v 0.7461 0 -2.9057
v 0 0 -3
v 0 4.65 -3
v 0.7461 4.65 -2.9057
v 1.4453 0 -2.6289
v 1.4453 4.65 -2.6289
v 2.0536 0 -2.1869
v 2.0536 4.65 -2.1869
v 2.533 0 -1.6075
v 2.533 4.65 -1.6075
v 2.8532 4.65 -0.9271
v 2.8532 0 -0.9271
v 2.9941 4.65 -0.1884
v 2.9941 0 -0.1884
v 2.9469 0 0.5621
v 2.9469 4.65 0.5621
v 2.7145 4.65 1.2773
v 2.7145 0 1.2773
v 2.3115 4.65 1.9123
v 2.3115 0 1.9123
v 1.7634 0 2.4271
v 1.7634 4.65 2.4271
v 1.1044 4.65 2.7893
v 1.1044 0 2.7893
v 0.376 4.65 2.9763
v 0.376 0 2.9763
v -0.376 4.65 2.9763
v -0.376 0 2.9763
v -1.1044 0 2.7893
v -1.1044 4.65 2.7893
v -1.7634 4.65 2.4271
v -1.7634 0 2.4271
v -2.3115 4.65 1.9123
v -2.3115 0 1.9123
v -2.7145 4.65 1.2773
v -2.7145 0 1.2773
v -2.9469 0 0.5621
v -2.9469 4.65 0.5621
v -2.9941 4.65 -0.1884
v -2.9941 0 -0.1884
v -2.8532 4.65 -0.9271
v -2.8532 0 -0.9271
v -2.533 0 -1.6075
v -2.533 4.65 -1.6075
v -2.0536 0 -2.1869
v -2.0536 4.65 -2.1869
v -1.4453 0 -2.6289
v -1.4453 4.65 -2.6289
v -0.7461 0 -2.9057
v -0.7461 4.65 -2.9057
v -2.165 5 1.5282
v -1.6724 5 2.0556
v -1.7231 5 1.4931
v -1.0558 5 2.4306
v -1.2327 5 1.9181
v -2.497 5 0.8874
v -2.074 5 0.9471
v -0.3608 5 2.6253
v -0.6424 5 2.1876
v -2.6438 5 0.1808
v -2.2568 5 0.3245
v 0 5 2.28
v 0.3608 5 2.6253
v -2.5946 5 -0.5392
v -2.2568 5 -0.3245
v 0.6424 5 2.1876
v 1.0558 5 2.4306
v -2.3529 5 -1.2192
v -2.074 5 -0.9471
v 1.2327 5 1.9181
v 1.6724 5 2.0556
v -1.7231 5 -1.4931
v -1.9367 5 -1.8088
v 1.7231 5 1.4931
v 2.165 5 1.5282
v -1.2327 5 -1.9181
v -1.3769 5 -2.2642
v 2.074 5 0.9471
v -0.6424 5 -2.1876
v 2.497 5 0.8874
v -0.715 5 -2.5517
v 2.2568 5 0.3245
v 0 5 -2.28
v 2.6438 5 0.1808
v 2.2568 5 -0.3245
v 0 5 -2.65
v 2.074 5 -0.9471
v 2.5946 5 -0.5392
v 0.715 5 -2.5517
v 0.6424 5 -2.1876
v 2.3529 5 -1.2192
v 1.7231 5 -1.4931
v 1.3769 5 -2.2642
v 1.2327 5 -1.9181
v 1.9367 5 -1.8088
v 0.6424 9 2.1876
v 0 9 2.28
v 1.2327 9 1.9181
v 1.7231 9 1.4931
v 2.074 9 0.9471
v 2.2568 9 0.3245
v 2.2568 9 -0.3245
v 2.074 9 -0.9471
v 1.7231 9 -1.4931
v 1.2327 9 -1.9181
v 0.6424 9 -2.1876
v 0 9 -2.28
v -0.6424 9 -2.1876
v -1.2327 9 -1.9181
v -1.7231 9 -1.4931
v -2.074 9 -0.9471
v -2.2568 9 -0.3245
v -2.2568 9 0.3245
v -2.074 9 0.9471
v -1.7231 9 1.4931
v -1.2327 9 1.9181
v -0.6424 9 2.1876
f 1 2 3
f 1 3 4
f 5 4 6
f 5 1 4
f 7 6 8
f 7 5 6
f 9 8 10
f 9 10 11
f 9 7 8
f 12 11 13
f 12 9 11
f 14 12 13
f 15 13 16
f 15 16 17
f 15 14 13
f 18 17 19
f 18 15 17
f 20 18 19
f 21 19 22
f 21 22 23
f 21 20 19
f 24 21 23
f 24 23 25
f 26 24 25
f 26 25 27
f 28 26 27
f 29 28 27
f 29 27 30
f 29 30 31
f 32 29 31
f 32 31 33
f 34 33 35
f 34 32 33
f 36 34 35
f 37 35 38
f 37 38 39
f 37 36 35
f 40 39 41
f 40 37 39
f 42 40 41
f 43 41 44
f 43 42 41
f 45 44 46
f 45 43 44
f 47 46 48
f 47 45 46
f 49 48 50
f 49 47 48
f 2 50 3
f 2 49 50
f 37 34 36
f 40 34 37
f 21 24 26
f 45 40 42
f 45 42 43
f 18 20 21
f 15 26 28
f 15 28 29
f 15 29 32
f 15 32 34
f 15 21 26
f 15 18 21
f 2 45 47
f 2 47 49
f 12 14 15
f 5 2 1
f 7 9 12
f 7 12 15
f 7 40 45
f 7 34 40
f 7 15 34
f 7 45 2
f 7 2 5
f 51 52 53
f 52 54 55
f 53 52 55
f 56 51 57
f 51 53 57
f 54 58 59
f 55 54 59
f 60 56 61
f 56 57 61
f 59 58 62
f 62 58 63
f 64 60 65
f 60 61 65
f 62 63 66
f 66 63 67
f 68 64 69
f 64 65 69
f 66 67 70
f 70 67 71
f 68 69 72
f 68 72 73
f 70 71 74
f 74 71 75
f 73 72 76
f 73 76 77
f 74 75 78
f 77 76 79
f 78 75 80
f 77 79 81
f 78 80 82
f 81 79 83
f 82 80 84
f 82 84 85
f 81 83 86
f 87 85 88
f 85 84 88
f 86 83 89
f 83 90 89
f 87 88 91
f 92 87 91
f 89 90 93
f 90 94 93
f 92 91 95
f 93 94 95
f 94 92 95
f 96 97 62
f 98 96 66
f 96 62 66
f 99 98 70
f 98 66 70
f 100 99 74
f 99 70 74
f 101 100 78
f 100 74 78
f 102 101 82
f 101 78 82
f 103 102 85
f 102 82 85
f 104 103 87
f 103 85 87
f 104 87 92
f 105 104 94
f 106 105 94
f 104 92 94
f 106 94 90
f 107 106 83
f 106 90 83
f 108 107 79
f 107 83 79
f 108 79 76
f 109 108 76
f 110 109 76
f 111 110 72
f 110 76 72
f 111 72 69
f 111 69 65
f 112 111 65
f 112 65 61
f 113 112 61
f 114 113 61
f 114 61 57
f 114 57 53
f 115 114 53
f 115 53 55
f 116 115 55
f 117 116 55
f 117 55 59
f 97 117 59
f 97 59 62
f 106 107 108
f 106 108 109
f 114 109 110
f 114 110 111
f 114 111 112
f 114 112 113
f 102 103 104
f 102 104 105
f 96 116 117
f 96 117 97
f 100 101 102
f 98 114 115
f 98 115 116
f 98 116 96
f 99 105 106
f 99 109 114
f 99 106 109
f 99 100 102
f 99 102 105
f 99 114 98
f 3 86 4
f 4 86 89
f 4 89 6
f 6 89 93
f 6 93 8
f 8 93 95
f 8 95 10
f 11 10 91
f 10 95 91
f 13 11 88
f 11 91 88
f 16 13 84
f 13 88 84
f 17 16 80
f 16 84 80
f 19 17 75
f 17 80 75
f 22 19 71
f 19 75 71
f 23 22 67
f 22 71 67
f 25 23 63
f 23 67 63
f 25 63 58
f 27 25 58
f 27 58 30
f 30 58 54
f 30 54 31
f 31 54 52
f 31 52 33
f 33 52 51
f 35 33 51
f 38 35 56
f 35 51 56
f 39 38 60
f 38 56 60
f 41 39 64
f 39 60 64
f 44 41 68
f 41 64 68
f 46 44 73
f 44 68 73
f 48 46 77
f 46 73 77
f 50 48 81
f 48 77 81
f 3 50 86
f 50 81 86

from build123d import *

# Parameters (mm, degrees)
SKETCH1_R           = 2.28
BOSS_EXTRUDE1_DEPTH = 9
SKETCH2_R           = 3
BOSS_EXTRUDE2_DEPTH = 5
CHAMFER1_SIZE       = 0.35


with BuildPart() as part:
    # Sketch1 → Boss-Extrude1 (new body)
    with BuildSketch(Plane(origin=(0, 0, 0), x_dir=(1, 0, 0), z_dir=(0, 1, 0))):
        with Locations(Location((0, 0, 0), (0, 0, 270))):
            Circle(SKETCH1_R)
    extrude(amount=BOSS_EXTRUDE1_DEPTH)

    # Sketch2 → Boss-Extrude2 (add)
    with BuildSketch(Plane(origin=(0, 0, 0), x_dir=(-1, 0, 0), z_dir=(0, -1, 0))):
        with Locations(Location((0, 0, 0), (0, 0, 90))):
            Circle(SKETCH2_R)
    extrude(amount=-BOSS_EXTRUDE2_DEPTH)

    # Chamfer1
    chamfer1_edges = [part.edges().sort_by_distance(p)[0] for p in [
        (0, 5, 3),
    ]]
    chamfer(chamfer1_edges, length=CHAMFER1_SIZE)


solid = part.part
